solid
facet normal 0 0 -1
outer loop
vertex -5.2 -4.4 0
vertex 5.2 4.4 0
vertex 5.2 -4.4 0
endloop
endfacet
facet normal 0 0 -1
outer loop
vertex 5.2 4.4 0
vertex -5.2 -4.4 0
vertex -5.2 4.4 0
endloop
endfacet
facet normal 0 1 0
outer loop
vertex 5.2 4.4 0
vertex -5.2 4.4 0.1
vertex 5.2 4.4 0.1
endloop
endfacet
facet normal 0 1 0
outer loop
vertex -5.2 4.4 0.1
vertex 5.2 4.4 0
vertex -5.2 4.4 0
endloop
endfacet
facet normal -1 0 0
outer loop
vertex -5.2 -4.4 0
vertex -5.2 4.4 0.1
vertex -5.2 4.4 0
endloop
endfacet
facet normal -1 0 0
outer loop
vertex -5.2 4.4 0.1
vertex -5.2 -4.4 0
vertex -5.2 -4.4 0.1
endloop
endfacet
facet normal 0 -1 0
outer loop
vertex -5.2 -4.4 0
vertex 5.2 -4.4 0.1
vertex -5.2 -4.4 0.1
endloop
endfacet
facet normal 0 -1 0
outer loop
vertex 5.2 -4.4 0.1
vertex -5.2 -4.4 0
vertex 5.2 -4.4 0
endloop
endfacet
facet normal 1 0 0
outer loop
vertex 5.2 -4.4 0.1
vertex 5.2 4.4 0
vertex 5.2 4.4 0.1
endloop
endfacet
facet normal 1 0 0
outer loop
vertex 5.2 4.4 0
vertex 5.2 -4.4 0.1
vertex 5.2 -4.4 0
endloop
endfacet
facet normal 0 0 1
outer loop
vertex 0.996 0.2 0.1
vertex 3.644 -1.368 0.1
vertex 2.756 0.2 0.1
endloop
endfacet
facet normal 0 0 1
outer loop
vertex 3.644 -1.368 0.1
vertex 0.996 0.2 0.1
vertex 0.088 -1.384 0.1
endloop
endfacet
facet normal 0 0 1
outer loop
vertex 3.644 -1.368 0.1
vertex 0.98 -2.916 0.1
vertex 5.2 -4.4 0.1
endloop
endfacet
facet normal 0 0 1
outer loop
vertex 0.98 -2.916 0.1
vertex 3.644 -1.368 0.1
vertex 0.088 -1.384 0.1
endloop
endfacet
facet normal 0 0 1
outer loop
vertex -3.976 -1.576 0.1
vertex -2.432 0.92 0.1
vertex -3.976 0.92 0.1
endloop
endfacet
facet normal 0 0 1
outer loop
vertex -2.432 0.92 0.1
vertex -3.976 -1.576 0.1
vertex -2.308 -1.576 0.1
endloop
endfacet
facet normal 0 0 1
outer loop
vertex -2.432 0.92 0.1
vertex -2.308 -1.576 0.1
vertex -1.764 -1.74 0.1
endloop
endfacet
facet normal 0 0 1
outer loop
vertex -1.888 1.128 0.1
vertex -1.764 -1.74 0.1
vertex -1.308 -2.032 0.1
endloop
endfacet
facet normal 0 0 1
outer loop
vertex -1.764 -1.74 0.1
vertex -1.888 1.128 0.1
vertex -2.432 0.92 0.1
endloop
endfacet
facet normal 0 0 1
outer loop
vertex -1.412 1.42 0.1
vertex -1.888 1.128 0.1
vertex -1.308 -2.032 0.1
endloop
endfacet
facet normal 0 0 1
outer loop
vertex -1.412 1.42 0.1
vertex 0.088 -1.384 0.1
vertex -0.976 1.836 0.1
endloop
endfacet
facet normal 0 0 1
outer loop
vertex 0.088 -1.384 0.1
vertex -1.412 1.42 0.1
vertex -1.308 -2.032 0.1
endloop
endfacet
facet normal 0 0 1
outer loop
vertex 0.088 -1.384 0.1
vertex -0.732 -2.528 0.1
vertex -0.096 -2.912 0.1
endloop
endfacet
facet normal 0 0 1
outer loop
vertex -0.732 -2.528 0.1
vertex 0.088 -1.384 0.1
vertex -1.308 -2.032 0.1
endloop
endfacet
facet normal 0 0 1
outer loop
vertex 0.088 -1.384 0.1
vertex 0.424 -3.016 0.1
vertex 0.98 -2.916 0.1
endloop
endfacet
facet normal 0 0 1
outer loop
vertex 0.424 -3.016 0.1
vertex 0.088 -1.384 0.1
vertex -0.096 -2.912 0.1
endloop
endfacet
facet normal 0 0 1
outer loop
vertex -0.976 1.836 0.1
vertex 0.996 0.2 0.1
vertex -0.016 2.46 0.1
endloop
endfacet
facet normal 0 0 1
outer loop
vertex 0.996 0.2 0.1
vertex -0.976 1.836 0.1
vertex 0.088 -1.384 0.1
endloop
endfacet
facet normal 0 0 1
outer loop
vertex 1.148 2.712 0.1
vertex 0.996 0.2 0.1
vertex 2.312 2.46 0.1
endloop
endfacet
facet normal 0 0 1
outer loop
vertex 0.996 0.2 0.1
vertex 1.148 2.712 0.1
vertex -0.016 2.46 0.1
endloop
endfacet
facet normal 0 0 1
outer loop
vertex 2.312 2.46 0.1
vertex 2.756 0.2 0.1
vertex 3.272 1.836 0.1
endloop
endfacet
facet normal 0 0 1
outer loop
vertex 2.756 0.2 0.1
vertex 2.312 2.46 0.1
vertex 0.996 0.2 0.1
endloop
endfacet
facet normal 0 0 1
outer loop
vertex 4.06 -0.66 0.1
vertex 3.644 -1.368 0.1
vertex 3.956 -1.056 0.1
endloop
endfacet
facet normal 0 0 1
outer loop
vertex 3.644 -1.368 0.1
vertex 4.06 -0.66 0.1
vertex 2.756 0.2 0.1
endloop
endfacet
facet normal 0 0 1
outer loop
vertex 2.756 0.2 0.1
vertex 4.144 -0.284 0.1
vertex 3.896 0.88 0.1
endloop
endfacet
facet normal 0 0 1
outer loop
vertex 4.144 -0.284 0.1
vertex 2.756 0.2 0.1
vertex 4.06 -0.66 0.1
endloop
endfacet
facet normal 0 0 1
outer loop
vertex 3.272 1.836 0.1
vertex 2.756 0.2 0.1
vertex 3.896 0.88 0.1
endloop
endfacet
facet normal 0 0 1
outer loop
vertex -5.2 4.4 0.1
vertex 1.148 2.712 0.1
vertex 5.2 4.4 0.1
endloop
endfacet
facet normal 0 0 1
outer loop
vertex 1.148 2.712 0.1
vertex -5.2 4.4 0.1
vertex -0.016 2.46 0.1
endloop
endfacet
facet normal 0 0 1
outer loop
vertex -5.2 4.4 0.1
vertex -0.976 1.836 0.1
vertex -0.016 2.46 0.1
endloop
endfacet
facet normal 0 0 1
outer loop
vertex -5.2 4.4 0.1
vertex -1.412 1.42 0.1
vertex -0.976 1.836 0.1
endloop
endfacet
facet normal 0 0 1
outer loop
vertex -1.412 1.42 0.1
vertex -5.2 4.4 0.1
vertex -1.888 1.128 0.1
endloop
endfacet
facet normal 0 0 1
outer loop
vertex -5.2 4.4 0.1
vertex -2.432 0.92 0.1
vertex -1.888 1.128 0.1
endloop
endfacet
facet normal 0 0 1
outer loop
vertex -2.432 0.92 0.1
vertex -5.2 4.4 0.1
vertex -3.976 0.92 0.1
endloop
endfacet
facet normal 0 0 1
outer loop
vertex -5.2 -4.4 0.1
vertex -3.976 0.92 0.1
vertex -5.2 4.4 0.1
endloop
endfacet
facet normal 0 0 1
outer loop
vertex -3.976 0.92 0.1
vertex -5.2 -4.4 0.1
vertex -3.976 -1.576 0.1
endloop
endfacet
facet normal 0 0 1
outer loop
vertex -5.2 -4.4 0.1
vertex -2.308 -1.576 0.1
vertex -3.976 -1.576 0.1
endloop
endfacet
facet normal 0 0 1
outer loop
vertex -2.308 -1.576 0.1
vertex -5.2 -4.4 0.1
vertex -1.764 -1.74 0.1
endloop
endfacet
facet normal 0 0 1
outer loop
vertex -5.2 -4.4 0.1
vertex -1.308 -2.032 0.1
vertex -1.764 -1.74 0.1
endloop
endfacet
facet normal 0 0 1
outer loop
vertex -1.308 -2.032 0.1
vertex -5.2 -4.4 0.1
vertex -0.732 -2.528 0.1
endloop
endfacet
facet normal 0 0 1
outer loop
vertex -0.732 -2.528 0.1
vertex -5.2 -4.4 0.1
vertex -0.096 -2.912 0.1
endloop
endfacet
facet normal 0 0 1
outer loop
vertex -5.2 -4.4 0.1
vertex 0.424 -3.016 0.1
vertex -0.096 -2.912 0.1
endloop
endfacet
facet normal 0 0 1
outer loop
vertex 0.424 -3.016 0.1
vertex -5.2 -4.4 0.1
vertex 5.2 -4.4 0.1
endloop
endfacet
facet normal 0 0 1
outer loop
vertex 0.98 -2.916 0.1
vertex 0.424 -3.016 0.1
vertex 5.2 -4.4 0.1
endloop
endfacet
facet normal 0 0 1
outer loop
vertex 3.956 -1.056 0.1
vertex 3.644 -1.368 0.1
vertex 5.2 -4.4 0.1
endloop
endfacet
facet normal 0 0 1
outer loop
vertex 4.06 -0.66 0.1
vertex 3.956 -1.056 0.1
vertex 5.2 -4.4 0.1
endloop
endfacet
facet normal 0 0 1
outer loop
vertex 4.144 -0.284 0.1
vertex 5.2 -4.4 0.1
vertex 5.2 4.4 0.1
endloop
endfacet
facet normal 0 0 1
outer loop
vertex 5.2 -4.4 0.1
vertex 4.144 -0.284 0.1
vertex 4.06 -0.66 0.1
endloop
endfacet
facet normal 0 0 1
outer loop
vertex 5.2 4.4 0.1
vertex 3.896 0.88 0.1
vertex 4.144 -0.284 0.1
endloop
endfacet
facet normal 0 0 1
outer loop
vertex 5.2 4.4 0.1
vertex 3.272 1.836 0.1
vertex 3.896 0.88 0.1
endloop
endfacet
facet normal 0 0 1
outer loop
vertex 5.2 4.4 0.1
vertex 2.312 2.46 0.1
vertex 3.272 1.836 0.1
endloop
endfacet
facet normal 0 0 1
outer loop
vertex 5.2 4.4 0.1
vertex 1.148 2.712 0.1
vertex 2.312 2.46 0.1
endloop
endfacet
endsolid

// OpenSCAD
// file: ../p/box5-12.scad
use <../lib.scad>
function ldraw_lib__box5_12() = [
// 0 Box with 5 Faces without Any Edges
// 0 Name: box5-12.dat
// 0 Author: Chris Dee [cwdee]
// 0 !LDRAW_ORG Primitive UPDATE 2009-02
// 0 !LICENSE Licensed under CC BY 2.0 and CC BY 4.0 : see CAreadme.txt
// 
// 0 BFC CERTIFY CCW
  [0,"BFC","CERTIFY"],
  [0,"BFC","CCW"],
// 
// 0 !HISTORY 2009-09-03 [PTadmin] Official Update 2009-02
// 
// 
// 4 16 1 1 1 1 1 -1 -1 1 -1 -1 1 1
  [4,16,1,1,1,1,1,-1,-1,1,-1,-1,1,1],
// 4 16 -1 0 1 1 0 1 1 1 1 -1 1 1
  [4,16,-1,0,1,1,0,1,1,1,1,-1,1,1],
// 4 16 -1 0 -1 -1 0 1 -1 1 1 -1 1 -1
  [4,16,-1,0,-1,-1,0,1,-1,1,1,-1,1,-1],
// 4 16 1 0 -1 -1 0 -1 -1 1 -1 1 1 -1
  [4,16,1,0,-1,-1,0,-1,-1,1,-1,1,1,-1],
// 4 16 1 0 1 1 0 -1 1 1 -1 1 1 1
  [4,16,1,0,1,1,0,-1,1,1,-1,1,1,1],
// 0
];
makepoly(ldraw_lib__box5_12(), line=0.2);
// main file
use <../lib.scad>
use <../p/box5-12.scad>
function ldraw_lib__195985d() = [
// 0 Sticker  1.1 x  1.3 with Yellow Wrench on Black Background
// 0 Name: 195985d.dat
// 0 Author: Takeshi Takahashi [RainbowDolphin]
// 0 !LDRAW_ORG Part UPDATE 2022-05
// 0 !LICENSE Licensed under CC BY 2.0 and CC BY 4.0 : see CAreadme.txt
// 
// 0 BFC CERTIFY CCW
  [0,"BFC","CERTIFY"],
  [0,"BFC","CCW"],
// 
// 0 !KEYWORDS Bricklink 6373stk01, Brickowl 426334, Motorcycle shop
// 0 !KEYWORDS Rebrickable 195985, Repair, Set 6373
// 
// 0 !HISTORY 2021-09-26 [RainbowDolphin] Created based on 3010p03 by Chris Dee [cwdee]
// 0 !HISTORY 2022-09-15 [PTadmin] Official Update 2022-05
// 
// 
// 1 16 0 -0.25 0 13 0 0 0 0.25 0 0 0 11 box5-12.dat
  [1,16,0,-0.25,0,13,0,0,0,0.25,0,0,0,11, ldraw_lib__box5_12()],
// 4 0 6.89 -0.25 0.5 2.49 -0.25 0.5 0.22 -0.25 -3.46 9.11 -0.25 -3.42
  [4,0,6.89,-0.25,0.5,2.49,-0.25,0.5,0.22,-0.25,-3.46,9.11,-0.25,-3.42],
// 4 0 9.11 -0.25 -3.42 0.22 -0.25 -3.46 2.45 -0.25 -7.29 13 -0.25 -11
  [4,0,9.11,-0.25,-3.42,0.22,-0.25,-3.46,2.45,-0.25,-7.29,13,-0.25,-11],
// 4 14 -5.77 -0.25 -3.94 -6.08 -0.25 2.3 -9.94 -0.25 2.3 -9.94 -0.25 -3.94
  [4,14,-5.77,-0.25,-3.94,-6.08,-0.25,2.3,-9.94,-0.25,2.3,-9.94,-0.25,-3.94],
// 3 14 -6.08 -0.25 2.3 -5.77 -0.25 -3.94 -4.41 -0.25 -4.35
  [3,14,-6.08,-0.25,2.3,-5.77,-0.25,-3.94,-4.41,-0.25,-4.35],
// 4 14 -6.08 -0.25 2.3 -4.41 -0.25 -4.35 -3.27 -0.25 -5.08 -4.72 -0.25 2.82
  [4,14,-6.08,-0.25,2.3,-4.41,-0.25,-4.35,-3.27,-0.25,-5.08,-4.72,-0.25,2.82],
// 3 14 -3.53 -0.25 3.55 -4.72 -0.25 2.82 -3.27 -0.25 -5.08
  [3,14,-3.53,-0.25,3.55,-4.72,-0.25,2.82,-3.27,-0.25,-5.08],
// 4 14 -2.44 -0.25 4.59 -3.53 -0.25 3.55 -3.27 -0.25 -5.08 0.22 -0.25 -3.46
  [4,14,-2.44,-0.25,4.59,-3.53,-0.25,3.55,-3.27,-0.25,-5.08,0.22,-0.25,-3.46],
// 4 14 0.22 -0.25 -3.46 -3.27 -0.25 -5.08 -1.83 -0.25 -6.32 -0.24 -0.25 -7.28
  [4,14,0.22,-0.25,-3.46,-3.27,-0.25,-5.08,-1.83,-0.25,-6.32,-0.24,-0.25,-7.28],
// 4 14 1.06 -0.25 -7.54 2.45 -0.25 -7.29 0.22 -0.25 -3.46 -0.24 -0.25 -7.28
  [4,14,1.06,-0.25,-7.54,2.45,-0.25,-7.29,0.22,-0.25,-3.46,-0.24,-0.25,-7.28],
// 4 14 -2.44 -0.25 4.59 0.22 -0.25 -3.46 2.49 -0.25 0.5 -0.04 -0.25 6.15
  [4,14,-2.44,-0.25,4.59,0.22,-0.25,-3.46,2.49,-0.25,0.5,-0.04,-0.25,6.15],
// 4 14 2.87 -0.25 6.78 -0.04 -0.25 6.15 2.49 -0.25 0.5 5.78 -0.25 6.15
  [4,14,2.87,-0.25,6.78,-0.04,-0.25,6.15,2.49,-0.25,0.5,5.78,-0.25,6.15],
// 4 14 5.78 -0.25 6.15 2.49 -0.25 0.5 6.89 -0.25 0.5 8.18 -0.25 4.59
  [4,14,5.78,-0.25,6.15,2.49,-0.25,0.5,6.89,-0.25,0.5,8.18,-0.25,4.59],
// 4 14 9.11 -0.25 -3.42 9.89 -0.25 -2.64 10.15 -0.25 -1.65 6.89 -0.25 0.5
  [4,14,9.11,-0.25,-3.42,9.89,-0.25,-2.64,10.15,-0.25,-1.65,6.89,-0.25,0.5],
// 4 14 6.89 -0.25 0.5 10.15 -0.25 -1.65 10.36 -0.25 -0.71 9.74 -0.25 2.2
  [4,14,6.89,-0.25,0.5,10.15,-0.25,-1.65,10.36,-0.25,-0.71,9.74,-0.25,2.2],
// 3 14 8.18 -0.25 4.59 6.89 -0.25 0.5 9.74 -0.25 2.2
  [3,14,8.18,-0.25,4.59,6.89,-0.25,0.5,9.74,-0.25,2.2],
// 4 0 2.87 -0.25 6.78 13 -0.25 11 -13 -0.25 11 -0.04 -0.25 6.15
  [4,0,2.87,-0.25,6.78,13,-0.25,11,-13,-0.25,11,-0.04,-0.25,6.15],
// 3 0 -13 -0.25 11 -2.44 -0.25 4.59 -0.04 -0.25 6.15
  [3,0,-13,-0.25,11,-2.44,-0.25,4.59,-0.04,-0.25,6.15],
// 4 0 -3.53 -0.25 3.55 -2.44 -0.25 4.59 -13 -0.25 11 -4.72 -0.25 2.82
  [4,0,-3.53,-0.25,3.55,-2.44,-0.25,4.59,-13,-0.25,11,-4.72,-0.25,2.82],
// 4 0 -6.08 -0.25 2.3 -4.72 -0.25 2.82 -13 -0.25 11 -9.94 -0.25 2.3
  [4,0,-6.08,-0.25,2.3,-4.72,-0.25,2.82,-13,-0.25,11,-9.94,-0.25,2.3],
// 4 0 -9.94 -0.25 -3.94 -9.94 -0.25 2.3 -13 -0.25 11 -13 -0.25 -11
  [4,0,-9.94,-0.25,-3.94,-9.94,-0.25,2.3,-13,-0.25,11,-13,-0.25,-11],
// 4 0 -5.77 -0.25 -3.94 -9.94 -0.25 -3.94 -13 -0.25 -11 -4.41 -0.25 -4.35
  [4,0,-5.77,-0.25,-3.94,-9.94,-0.25,-3.94,-13,-0.25,-11,-4.41,-0.25,-4.35],
// 4 0 -3.27 -0.25 -5.08 -4.41 -0.25 -4.35 -13 -0.25 -11 -1.83 -0.25 -6.32
  [4,0,-3.27,-0.25,-5.08,-4.41,-0.25,-4.35,-13,-0.25,-11,-1.83,-0.25,-6.32],
// 3 0 -1.83 -0.25 -6.32 -13 -0.25 -11 -0.24 -0.25 -7.28
  [3,0,-1.83,-0.25,-6.32,-13,-0.25,-11,-0.24,-0.25,-7.28],
// 4 0 1.06 -0.25 -7.54 -0.24 -0.25 -7.28 -13 -0.25 -11 13 -0.25 -11
  [4,0,1.06,-0.25,-7.54,-0.24,-0.25,-7.28,-13,-0.25,-11,13,-0.25,-11],
// 3 0 2.45 -0.25 -7.29 1.06 -0.25 -7.54 13 -0.25 -11
  [3,0,2.45,-0.25,-7.29,1.06,-0.25,-7.54,13,-0.25,-11],
// 3 0 9.89 -0.25 -2.64 9.11 -0.25 -3.42 13 -0.25 -11
  [3,0,9.89,-0.25,-2.64,9.11,-0.25,-3.42,13,-0.25,-11],
// 3 0 10.15 -0.25 -1.65 9.89 -0.25 -2.64 13 -0.25 -11
  [3,0,10.15,-0.25,-1.65,9.89,-0.25,-2.64,13,-0.25,-11],
// 4 0 10.36 -0.25 -0.71 10.15 -0.25 -1.65 13 -0.25 -11 13 -0.25 11
  [4,0,10.36,-0.25,-0.71,10.15,-0.25,-1.65,13,-0.25,-11,13,-0.25,11],
// 3 0 13 -0.25 11 9.74 -0.25 2.2 10.36 -0.25 -0.71
  [3,0,13,-0.25,11,9.74,-0.25,2.2,10.36,-0.25,-0.71],
// 3 0 13 -0.25 11 8.18 -0.25 4.59 9.74 -0.25 2.2
  [3,0,13,-0.25,11,8.18,-0.25,4.59,9.74,-0.25,2.2],
// 3 0 13 -0.25 11 5.78 -0.25 6.15 8.18 -0.25 4.59
  [3,0,13,-0.25,11,5.78,-0.25,6.15,8.18,-0.25,4.59],
// 3 0 13 -0.25 11 2.87 -0.25 6.78 5.78 -0.25 6.15
  [3,0,13,-0.25,11,2.87,-0.25,6.78,5.78,-0.25,6.15],
];
makepoly(ldraw_lib__195985d(), line=0.2);
